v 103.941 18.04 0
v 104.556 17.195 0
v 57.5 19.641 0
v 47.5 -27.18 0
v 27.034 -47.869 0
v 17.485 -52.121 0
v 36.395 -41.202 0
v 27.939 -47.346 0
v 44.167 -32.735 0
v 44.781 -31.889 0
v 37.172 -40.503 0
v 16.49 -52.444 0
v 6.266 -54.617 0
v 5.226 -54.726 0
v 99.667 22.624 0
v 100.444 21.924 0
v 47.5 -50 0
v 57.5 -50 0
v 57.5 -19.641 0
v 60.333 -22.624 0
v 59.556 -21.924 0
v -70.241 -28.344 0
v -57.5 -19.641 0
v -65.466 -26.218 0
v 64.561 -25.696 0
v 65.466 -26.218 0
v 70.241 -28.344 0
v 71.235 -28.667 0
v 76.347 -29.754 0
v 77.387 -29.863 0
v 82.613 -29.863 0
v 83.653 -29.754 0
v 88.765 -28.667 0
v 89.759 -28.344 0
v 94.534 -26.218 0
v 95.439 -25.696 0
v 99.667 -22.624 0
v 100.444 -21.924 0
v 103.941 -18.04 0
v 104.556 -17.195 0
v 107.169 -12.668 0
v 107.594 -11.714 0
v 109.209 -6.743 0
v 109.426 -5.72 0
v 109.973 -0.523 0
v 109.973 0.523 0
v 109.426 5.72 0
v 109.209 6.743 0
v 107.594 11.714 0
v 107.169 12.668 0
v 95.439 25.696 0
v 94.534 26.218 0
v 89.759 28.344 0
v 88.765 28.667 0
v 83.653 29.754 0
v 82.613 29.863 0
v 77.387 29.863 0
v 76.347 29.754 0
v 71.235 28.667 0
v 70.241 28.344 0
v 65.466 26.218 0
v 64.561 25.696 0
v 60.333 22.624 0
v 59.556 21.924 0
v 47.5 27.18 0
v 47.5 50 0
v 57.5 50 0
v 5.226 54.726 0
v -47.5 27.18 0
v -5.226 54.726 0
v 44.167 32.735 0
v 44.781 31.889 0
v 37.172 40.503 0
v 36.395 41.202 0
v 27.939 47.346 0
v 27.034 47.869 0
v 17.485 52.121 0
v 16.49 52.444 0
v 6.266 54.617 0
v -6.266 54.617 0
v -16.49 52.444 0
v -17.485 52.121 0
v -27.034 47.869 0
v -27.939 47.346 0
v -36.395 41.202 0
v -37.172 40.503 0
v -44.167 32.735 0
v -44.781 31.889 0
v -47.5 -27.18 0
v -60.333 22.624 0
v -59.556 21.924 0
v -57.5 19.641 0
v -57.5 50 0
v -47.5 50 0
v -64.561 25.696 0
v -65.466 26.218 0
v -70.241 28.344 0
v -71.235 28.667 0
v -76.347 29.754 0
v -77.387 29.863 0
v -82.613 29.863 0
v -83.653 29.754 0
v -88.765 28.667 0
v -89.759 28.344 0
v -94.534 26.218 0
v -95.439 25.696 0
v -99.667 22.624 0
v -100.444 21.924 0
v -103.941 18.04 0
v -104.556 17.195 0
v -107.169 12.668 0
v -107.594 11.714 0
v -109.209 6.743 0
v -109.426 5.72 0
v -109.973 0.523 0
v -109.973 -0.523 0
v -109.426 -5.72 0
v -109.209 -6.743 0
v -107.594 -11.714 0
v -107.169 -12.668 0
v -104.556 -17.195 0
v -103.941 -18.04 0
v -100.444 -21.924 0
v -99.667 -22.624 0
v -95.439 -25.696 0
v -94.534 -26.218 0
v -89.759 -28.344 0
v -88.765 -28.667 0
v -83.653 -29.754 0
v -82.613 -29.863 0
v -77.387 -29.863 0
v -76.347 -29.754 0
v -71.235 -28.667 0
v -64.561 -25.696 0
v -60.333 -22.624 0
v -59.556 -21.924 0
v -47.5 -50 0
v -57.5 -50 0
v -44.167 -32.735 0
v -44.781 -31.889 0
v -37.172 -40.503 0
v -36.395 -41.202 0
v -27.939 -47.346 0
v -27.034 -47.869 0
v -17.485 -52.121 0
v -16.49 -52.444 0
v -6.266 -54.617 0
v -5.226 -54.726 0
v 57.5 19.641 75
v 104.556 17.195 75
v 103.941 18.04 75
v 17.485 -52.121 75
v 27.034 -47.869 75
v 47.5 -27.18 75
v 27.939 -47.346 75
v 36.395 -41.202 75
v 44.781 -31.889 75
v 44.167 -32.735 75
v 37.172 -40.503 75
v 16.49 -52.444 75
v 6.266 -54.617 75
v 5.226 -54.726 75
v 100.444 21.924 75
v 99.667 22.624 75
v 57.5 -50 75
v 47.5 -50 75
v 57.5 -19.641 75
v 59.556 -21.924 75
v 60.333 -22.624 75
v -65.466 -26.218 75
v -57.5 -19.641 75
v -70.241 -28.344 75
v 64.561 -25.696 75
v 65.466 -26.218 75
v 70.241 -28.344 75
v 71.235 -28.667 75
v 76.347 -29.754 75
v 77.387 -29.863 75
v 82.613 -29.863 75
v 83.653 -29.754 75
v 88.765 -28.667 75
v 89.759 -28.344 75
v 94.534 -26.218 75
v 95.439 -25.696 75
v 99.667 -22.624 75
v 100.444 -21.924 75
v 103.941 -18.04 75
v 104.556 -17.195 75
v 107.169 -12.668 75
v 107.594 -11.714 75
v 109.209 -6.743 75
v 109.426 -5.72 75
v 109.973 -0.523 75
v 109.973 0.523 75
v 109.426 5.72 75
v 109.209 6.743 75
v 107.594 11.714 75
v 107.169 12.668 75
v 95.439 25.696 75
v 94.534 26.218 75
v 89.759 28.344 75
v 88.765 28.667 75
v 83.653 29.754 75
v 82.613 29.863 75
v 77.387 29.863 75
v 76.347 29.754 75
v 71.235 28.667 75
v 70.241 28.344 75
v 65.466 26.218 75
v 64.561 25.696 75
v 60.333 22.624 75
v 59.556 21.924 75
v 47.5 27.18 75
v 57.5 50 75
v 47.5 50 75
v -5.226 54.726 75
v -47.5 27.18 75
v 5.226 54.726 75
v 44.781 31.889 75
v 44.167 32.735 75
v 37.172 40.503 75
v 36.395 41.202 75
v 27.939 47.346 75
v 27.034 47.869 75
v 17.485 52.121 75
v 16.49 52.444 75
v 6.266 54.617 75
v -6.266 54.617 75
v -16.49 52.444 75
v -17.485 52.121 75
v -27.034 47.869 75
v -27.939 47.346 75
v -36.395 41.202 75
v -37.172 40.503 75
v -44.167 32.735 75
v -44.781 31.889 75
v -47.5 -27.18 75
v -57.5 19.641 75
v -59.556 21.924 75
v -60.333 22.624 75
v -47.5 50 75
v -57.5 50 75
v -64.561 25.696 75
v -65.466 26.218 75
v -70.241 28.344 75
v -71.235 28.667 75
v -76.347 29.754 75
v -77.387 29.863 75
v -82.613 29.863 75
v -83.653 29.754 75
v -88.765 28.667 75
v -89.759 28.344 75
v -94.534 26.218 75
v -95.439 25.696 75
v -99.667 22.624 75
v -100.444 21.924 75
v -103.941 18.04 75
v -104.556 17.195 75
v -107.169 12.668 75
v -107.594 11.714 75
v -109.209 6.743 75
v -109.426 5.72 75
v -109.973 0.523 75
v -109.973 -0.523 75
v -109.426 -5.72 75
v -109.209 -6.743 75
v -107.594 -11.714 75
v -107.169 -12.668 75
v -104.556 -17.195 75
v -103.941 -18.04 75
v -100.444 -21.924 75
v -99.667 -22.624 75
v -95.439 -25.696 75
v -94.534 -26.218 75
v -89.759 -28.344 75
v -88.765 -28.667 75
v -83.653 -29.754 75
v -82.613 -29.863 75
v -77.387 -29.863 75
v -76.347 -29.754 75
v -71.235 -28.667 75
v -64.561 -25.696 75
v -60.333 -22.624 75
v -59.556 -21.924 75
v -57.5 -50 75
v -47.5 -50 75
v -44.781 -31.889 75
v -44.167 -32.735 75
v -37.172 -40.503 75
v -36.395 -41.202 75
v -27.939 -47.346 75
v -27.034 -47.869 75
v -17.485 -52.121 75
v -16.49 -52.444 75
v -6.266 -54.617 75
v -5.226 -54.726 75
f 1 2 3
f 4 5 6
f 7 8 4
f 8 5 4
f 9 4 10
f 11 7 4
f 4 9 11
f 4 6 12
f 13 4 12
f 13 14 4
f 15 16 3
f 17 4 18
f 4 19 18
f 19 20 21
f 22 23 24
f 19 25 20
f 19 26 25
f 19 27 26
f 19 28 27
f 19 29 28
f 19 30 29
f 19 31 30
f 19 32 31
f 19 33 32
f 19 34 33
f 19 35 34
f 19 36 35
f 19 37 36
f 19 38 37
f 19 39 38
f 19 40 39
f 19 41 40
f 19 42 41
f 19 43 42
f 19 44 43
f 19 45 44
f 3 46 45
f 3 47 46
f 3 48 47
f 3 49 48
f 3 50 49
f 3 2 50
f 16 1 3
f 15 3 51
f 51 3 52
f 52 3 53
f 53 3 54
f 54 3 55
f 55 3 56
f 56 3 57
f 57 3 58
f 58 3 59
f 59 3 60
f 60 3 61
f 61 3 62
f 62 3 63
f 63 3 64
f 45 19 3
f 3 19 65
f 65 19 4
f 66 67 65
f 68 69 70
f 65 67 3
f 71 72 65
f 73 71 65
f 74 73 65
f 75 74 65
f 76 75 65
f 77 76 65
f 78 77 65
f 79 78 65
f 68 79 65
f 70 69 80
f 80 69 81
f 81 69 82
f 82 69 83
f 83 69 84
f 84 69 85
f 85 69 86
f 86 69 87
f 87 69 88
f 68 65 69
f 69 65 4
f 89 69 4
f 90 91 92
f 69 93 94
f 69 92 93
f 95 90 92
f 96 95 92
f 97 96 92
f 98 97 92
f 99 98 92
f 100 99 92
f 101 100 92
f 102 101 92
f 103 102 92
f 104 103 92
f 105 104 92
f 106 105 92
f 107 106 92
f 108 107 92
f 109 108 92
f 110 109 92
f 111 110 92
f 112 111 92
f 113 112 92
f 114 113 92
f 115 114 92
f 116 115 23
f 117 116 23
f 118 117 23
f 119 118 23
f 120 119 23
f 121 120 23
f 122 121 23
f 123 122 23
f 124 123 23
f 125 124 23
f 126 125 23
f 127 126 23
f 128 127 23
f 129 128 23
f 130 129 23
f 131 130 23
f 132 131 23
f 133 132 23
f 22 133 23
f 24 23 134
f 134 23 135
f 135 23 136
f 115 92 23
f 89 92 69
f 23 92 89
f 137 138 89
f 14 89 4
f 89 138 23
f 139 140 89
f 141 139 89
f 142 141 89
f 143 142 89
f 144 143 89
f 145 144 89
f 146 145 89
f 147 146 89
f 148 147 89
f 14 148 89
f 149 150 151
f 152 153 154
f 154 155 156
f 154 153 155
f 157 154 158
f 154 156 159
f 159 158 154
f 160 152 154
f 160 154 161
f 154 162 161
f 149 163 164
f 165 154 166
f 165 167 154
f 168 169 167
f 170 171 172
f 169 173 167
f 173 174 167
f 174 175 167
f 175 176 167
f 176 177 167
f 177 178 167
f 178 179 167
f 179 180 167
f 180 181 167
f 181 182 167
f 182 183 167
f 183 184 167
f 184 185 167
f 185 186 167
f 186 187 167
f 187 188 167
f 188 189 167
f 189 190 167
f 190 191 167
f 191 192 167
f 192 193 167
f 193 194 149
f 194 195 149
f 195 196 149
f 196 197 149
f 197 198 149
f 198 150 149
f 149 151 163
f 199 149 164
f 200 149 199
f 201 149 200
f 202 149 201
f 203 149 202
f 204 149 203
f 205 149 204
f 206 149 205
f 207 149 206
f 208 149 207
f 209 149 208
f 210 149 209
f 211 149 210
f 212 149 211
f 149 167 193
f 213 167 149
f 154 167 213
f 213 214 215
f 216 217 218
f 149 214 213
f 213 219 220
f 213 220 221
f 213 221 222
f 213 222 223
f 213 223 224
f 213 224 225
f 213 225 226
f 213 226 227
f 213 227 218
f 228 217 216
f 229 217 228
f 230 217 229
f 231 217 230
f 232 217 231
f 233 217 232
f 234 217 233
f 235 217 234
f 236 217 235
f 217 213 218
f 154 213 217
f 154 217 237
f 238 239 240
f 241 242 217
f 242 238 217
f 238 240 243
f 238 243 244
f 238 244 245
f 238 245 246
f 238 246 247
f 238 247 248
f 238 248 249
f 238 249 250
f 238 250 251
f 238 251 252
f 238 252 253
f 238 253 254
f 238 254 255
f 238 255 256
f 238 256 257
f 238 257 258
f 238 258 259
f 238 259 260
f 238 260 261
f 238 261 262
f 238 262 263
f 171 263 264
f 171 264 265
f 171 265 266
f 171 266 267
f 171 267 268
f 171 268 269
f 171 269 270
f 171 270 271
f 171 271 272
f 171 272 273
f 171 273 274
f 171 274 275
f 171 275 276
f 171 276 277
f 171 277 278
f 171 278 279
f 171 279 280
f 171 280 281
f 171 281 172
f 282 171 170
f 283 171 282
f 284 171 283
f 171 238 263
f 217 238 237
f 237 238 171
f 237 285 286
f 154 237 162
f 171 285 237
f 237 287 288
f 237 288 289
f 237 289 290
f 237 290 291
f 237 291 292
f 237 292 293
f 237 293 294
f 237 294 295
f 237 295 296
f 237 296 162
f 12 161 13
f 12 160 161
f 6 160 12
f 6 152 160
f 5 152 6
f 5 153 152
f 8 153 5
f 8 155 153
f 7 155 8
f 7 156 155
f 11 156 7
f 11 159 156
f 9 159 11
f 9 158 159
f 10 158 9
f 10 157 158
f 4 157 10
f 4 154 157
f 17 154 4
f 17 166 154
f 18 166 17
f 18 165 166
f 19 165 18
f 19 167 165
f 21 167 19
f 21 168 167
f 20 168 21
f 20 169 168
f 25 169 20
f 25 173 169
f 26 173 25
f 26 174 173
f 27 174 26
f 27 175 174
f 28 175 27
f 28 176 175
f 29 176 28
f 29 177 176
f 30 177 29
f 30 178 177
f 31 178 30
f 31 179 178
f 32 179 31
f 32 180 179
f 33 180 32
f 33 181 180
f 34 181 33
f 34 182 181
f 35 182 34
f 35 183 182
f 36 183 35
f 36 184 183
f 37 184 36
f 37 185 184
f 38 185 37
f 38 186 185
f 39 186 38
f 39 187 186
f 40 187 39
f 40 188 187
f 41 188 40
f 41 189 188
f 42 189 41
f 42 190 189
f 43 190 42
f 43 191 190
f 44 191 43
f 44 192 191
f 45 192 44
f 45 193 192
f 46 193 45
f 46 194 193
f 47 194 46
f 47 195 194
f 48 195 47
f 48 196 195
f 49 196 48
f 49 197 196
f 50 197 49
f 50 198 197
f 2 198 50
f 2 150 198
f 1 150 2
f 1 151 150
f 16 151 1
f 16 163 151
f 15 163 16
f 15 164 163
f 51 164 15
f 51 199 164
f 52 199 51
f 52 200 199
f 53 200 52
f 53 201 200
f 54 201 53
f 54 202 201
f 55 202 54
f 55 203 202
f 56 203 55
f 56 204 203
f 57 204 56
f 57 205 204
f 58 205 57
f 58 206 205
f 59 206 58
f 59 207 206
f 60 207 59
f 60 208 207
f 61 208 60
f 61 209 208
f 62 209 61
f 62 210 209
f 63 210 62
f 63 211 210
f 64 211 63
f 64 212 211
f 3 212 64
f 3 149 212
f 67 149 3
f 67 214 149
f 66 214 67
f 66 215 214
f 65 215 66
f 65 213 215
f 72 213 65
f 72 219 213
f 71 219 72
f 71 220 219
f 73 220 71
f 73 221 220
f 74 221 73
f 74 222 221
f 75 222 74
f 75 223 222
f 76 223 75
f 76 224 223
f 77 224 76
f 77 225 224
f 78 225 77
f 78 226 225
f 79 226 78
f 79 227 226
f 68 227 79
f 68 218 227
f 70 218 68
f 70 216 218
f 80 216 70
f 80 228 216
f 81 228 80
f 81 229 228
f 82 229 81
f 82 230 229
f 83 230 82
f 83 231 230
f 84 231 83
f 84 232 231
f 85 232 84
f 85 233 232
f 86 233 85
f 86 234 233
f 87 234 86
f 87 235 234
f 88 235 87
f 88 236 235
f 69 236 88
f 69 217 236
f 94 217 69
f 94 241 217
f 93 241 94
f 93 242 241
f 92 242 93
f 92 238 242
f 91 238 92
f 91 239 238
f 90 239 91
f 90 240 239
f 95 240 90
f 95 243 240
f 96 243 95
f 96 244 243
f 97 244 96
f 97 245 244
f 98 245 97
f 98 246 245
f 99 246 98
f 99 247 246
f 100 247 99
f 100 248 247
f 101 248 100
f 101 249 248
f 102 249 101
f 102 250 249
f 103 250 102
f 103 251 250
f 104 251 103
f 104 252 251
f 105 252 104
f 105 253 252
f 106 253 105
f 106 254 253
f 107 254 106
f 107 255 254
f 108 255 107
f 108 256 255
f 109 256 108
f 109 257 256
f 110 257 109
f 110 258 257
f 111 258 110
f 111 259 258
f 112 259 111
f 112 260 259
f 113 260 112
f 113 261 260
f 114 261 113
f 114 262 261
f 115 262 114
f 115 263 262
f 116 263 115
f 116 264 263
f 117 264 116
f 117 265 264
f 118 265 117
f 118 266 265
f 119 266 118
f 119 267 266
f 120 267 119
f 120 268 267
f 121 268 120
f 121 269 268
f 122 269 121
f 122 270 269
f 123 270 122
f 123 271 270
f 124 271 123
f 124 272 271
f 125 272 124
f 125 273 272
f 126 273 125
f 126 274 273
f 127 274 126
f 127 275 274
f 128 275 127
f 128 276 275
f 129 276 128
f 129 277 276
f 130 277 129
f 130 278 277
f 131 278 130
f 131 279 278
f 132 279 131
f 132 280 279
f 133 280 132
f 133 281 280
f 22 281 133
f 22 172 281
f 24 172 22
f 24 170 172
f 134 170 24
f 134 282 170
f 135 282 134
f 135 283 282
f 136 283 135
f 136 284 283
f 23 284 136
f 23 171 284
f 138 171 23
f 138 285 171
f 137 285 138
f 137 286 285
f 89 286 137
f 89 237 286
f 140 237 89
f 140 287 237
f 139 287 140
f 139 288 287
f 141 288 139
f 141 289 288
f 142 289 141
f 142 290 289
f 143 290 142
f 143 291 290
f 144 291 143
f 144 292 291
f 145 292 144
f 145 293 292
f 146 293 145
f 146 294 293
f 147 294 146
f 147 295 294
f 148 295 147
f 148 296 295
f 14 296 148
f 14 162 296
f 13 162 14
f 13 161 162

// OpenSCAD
eps =0.1;

////the big block
//
////  consists of three chambers; suitor left, suitor right, center stage
//
//side_chamber_rad = 25;
//central_chamber_rad = 50;
//chamber_spacing=5;
//
//// as well as two slot rails for the tabs to slide in
//
//rail_enclosure_length = 100;
//rail_enclosure_width = 10;
//
//block_height = 75;
module bigBlock(block_height = 75,side_chamber_rad = 25, central_chamber_rad = 50,chamber_spacing=5, rail_enclosure_length = 100, rail_enclosure_width = 10){
    linear_extrude(height = block_height){

    offset(r=5){
        translate([-side_chamber_rad-central_chamber_rad - chamber_spacing,0,0])circle(r=side_chamber_rad);
        translate([side_chamber_rad +central_chamber_rad + chamber_spacing,0,0])circle(r=side_chamber_rad);
        circle(r=central_chamber_rad);
    } // the chambers

    translate([-central_chamber_rad - chamber_spacing/2-rail_enclosure_width/2,-rail_enclosure_length/2,0])square(size=[rail_enclosure_width, rail_enclosure_length]); //enclosure 1
    
    translate([central_chamber_rad + chamber_spacing/2 -rail_enclosure_width/2,-rail_enclosure_length/2,0])square(size=[rail_enclosure_width, rail_enclosure_length]);//enclosure 2
    }
}
bigBlock();
